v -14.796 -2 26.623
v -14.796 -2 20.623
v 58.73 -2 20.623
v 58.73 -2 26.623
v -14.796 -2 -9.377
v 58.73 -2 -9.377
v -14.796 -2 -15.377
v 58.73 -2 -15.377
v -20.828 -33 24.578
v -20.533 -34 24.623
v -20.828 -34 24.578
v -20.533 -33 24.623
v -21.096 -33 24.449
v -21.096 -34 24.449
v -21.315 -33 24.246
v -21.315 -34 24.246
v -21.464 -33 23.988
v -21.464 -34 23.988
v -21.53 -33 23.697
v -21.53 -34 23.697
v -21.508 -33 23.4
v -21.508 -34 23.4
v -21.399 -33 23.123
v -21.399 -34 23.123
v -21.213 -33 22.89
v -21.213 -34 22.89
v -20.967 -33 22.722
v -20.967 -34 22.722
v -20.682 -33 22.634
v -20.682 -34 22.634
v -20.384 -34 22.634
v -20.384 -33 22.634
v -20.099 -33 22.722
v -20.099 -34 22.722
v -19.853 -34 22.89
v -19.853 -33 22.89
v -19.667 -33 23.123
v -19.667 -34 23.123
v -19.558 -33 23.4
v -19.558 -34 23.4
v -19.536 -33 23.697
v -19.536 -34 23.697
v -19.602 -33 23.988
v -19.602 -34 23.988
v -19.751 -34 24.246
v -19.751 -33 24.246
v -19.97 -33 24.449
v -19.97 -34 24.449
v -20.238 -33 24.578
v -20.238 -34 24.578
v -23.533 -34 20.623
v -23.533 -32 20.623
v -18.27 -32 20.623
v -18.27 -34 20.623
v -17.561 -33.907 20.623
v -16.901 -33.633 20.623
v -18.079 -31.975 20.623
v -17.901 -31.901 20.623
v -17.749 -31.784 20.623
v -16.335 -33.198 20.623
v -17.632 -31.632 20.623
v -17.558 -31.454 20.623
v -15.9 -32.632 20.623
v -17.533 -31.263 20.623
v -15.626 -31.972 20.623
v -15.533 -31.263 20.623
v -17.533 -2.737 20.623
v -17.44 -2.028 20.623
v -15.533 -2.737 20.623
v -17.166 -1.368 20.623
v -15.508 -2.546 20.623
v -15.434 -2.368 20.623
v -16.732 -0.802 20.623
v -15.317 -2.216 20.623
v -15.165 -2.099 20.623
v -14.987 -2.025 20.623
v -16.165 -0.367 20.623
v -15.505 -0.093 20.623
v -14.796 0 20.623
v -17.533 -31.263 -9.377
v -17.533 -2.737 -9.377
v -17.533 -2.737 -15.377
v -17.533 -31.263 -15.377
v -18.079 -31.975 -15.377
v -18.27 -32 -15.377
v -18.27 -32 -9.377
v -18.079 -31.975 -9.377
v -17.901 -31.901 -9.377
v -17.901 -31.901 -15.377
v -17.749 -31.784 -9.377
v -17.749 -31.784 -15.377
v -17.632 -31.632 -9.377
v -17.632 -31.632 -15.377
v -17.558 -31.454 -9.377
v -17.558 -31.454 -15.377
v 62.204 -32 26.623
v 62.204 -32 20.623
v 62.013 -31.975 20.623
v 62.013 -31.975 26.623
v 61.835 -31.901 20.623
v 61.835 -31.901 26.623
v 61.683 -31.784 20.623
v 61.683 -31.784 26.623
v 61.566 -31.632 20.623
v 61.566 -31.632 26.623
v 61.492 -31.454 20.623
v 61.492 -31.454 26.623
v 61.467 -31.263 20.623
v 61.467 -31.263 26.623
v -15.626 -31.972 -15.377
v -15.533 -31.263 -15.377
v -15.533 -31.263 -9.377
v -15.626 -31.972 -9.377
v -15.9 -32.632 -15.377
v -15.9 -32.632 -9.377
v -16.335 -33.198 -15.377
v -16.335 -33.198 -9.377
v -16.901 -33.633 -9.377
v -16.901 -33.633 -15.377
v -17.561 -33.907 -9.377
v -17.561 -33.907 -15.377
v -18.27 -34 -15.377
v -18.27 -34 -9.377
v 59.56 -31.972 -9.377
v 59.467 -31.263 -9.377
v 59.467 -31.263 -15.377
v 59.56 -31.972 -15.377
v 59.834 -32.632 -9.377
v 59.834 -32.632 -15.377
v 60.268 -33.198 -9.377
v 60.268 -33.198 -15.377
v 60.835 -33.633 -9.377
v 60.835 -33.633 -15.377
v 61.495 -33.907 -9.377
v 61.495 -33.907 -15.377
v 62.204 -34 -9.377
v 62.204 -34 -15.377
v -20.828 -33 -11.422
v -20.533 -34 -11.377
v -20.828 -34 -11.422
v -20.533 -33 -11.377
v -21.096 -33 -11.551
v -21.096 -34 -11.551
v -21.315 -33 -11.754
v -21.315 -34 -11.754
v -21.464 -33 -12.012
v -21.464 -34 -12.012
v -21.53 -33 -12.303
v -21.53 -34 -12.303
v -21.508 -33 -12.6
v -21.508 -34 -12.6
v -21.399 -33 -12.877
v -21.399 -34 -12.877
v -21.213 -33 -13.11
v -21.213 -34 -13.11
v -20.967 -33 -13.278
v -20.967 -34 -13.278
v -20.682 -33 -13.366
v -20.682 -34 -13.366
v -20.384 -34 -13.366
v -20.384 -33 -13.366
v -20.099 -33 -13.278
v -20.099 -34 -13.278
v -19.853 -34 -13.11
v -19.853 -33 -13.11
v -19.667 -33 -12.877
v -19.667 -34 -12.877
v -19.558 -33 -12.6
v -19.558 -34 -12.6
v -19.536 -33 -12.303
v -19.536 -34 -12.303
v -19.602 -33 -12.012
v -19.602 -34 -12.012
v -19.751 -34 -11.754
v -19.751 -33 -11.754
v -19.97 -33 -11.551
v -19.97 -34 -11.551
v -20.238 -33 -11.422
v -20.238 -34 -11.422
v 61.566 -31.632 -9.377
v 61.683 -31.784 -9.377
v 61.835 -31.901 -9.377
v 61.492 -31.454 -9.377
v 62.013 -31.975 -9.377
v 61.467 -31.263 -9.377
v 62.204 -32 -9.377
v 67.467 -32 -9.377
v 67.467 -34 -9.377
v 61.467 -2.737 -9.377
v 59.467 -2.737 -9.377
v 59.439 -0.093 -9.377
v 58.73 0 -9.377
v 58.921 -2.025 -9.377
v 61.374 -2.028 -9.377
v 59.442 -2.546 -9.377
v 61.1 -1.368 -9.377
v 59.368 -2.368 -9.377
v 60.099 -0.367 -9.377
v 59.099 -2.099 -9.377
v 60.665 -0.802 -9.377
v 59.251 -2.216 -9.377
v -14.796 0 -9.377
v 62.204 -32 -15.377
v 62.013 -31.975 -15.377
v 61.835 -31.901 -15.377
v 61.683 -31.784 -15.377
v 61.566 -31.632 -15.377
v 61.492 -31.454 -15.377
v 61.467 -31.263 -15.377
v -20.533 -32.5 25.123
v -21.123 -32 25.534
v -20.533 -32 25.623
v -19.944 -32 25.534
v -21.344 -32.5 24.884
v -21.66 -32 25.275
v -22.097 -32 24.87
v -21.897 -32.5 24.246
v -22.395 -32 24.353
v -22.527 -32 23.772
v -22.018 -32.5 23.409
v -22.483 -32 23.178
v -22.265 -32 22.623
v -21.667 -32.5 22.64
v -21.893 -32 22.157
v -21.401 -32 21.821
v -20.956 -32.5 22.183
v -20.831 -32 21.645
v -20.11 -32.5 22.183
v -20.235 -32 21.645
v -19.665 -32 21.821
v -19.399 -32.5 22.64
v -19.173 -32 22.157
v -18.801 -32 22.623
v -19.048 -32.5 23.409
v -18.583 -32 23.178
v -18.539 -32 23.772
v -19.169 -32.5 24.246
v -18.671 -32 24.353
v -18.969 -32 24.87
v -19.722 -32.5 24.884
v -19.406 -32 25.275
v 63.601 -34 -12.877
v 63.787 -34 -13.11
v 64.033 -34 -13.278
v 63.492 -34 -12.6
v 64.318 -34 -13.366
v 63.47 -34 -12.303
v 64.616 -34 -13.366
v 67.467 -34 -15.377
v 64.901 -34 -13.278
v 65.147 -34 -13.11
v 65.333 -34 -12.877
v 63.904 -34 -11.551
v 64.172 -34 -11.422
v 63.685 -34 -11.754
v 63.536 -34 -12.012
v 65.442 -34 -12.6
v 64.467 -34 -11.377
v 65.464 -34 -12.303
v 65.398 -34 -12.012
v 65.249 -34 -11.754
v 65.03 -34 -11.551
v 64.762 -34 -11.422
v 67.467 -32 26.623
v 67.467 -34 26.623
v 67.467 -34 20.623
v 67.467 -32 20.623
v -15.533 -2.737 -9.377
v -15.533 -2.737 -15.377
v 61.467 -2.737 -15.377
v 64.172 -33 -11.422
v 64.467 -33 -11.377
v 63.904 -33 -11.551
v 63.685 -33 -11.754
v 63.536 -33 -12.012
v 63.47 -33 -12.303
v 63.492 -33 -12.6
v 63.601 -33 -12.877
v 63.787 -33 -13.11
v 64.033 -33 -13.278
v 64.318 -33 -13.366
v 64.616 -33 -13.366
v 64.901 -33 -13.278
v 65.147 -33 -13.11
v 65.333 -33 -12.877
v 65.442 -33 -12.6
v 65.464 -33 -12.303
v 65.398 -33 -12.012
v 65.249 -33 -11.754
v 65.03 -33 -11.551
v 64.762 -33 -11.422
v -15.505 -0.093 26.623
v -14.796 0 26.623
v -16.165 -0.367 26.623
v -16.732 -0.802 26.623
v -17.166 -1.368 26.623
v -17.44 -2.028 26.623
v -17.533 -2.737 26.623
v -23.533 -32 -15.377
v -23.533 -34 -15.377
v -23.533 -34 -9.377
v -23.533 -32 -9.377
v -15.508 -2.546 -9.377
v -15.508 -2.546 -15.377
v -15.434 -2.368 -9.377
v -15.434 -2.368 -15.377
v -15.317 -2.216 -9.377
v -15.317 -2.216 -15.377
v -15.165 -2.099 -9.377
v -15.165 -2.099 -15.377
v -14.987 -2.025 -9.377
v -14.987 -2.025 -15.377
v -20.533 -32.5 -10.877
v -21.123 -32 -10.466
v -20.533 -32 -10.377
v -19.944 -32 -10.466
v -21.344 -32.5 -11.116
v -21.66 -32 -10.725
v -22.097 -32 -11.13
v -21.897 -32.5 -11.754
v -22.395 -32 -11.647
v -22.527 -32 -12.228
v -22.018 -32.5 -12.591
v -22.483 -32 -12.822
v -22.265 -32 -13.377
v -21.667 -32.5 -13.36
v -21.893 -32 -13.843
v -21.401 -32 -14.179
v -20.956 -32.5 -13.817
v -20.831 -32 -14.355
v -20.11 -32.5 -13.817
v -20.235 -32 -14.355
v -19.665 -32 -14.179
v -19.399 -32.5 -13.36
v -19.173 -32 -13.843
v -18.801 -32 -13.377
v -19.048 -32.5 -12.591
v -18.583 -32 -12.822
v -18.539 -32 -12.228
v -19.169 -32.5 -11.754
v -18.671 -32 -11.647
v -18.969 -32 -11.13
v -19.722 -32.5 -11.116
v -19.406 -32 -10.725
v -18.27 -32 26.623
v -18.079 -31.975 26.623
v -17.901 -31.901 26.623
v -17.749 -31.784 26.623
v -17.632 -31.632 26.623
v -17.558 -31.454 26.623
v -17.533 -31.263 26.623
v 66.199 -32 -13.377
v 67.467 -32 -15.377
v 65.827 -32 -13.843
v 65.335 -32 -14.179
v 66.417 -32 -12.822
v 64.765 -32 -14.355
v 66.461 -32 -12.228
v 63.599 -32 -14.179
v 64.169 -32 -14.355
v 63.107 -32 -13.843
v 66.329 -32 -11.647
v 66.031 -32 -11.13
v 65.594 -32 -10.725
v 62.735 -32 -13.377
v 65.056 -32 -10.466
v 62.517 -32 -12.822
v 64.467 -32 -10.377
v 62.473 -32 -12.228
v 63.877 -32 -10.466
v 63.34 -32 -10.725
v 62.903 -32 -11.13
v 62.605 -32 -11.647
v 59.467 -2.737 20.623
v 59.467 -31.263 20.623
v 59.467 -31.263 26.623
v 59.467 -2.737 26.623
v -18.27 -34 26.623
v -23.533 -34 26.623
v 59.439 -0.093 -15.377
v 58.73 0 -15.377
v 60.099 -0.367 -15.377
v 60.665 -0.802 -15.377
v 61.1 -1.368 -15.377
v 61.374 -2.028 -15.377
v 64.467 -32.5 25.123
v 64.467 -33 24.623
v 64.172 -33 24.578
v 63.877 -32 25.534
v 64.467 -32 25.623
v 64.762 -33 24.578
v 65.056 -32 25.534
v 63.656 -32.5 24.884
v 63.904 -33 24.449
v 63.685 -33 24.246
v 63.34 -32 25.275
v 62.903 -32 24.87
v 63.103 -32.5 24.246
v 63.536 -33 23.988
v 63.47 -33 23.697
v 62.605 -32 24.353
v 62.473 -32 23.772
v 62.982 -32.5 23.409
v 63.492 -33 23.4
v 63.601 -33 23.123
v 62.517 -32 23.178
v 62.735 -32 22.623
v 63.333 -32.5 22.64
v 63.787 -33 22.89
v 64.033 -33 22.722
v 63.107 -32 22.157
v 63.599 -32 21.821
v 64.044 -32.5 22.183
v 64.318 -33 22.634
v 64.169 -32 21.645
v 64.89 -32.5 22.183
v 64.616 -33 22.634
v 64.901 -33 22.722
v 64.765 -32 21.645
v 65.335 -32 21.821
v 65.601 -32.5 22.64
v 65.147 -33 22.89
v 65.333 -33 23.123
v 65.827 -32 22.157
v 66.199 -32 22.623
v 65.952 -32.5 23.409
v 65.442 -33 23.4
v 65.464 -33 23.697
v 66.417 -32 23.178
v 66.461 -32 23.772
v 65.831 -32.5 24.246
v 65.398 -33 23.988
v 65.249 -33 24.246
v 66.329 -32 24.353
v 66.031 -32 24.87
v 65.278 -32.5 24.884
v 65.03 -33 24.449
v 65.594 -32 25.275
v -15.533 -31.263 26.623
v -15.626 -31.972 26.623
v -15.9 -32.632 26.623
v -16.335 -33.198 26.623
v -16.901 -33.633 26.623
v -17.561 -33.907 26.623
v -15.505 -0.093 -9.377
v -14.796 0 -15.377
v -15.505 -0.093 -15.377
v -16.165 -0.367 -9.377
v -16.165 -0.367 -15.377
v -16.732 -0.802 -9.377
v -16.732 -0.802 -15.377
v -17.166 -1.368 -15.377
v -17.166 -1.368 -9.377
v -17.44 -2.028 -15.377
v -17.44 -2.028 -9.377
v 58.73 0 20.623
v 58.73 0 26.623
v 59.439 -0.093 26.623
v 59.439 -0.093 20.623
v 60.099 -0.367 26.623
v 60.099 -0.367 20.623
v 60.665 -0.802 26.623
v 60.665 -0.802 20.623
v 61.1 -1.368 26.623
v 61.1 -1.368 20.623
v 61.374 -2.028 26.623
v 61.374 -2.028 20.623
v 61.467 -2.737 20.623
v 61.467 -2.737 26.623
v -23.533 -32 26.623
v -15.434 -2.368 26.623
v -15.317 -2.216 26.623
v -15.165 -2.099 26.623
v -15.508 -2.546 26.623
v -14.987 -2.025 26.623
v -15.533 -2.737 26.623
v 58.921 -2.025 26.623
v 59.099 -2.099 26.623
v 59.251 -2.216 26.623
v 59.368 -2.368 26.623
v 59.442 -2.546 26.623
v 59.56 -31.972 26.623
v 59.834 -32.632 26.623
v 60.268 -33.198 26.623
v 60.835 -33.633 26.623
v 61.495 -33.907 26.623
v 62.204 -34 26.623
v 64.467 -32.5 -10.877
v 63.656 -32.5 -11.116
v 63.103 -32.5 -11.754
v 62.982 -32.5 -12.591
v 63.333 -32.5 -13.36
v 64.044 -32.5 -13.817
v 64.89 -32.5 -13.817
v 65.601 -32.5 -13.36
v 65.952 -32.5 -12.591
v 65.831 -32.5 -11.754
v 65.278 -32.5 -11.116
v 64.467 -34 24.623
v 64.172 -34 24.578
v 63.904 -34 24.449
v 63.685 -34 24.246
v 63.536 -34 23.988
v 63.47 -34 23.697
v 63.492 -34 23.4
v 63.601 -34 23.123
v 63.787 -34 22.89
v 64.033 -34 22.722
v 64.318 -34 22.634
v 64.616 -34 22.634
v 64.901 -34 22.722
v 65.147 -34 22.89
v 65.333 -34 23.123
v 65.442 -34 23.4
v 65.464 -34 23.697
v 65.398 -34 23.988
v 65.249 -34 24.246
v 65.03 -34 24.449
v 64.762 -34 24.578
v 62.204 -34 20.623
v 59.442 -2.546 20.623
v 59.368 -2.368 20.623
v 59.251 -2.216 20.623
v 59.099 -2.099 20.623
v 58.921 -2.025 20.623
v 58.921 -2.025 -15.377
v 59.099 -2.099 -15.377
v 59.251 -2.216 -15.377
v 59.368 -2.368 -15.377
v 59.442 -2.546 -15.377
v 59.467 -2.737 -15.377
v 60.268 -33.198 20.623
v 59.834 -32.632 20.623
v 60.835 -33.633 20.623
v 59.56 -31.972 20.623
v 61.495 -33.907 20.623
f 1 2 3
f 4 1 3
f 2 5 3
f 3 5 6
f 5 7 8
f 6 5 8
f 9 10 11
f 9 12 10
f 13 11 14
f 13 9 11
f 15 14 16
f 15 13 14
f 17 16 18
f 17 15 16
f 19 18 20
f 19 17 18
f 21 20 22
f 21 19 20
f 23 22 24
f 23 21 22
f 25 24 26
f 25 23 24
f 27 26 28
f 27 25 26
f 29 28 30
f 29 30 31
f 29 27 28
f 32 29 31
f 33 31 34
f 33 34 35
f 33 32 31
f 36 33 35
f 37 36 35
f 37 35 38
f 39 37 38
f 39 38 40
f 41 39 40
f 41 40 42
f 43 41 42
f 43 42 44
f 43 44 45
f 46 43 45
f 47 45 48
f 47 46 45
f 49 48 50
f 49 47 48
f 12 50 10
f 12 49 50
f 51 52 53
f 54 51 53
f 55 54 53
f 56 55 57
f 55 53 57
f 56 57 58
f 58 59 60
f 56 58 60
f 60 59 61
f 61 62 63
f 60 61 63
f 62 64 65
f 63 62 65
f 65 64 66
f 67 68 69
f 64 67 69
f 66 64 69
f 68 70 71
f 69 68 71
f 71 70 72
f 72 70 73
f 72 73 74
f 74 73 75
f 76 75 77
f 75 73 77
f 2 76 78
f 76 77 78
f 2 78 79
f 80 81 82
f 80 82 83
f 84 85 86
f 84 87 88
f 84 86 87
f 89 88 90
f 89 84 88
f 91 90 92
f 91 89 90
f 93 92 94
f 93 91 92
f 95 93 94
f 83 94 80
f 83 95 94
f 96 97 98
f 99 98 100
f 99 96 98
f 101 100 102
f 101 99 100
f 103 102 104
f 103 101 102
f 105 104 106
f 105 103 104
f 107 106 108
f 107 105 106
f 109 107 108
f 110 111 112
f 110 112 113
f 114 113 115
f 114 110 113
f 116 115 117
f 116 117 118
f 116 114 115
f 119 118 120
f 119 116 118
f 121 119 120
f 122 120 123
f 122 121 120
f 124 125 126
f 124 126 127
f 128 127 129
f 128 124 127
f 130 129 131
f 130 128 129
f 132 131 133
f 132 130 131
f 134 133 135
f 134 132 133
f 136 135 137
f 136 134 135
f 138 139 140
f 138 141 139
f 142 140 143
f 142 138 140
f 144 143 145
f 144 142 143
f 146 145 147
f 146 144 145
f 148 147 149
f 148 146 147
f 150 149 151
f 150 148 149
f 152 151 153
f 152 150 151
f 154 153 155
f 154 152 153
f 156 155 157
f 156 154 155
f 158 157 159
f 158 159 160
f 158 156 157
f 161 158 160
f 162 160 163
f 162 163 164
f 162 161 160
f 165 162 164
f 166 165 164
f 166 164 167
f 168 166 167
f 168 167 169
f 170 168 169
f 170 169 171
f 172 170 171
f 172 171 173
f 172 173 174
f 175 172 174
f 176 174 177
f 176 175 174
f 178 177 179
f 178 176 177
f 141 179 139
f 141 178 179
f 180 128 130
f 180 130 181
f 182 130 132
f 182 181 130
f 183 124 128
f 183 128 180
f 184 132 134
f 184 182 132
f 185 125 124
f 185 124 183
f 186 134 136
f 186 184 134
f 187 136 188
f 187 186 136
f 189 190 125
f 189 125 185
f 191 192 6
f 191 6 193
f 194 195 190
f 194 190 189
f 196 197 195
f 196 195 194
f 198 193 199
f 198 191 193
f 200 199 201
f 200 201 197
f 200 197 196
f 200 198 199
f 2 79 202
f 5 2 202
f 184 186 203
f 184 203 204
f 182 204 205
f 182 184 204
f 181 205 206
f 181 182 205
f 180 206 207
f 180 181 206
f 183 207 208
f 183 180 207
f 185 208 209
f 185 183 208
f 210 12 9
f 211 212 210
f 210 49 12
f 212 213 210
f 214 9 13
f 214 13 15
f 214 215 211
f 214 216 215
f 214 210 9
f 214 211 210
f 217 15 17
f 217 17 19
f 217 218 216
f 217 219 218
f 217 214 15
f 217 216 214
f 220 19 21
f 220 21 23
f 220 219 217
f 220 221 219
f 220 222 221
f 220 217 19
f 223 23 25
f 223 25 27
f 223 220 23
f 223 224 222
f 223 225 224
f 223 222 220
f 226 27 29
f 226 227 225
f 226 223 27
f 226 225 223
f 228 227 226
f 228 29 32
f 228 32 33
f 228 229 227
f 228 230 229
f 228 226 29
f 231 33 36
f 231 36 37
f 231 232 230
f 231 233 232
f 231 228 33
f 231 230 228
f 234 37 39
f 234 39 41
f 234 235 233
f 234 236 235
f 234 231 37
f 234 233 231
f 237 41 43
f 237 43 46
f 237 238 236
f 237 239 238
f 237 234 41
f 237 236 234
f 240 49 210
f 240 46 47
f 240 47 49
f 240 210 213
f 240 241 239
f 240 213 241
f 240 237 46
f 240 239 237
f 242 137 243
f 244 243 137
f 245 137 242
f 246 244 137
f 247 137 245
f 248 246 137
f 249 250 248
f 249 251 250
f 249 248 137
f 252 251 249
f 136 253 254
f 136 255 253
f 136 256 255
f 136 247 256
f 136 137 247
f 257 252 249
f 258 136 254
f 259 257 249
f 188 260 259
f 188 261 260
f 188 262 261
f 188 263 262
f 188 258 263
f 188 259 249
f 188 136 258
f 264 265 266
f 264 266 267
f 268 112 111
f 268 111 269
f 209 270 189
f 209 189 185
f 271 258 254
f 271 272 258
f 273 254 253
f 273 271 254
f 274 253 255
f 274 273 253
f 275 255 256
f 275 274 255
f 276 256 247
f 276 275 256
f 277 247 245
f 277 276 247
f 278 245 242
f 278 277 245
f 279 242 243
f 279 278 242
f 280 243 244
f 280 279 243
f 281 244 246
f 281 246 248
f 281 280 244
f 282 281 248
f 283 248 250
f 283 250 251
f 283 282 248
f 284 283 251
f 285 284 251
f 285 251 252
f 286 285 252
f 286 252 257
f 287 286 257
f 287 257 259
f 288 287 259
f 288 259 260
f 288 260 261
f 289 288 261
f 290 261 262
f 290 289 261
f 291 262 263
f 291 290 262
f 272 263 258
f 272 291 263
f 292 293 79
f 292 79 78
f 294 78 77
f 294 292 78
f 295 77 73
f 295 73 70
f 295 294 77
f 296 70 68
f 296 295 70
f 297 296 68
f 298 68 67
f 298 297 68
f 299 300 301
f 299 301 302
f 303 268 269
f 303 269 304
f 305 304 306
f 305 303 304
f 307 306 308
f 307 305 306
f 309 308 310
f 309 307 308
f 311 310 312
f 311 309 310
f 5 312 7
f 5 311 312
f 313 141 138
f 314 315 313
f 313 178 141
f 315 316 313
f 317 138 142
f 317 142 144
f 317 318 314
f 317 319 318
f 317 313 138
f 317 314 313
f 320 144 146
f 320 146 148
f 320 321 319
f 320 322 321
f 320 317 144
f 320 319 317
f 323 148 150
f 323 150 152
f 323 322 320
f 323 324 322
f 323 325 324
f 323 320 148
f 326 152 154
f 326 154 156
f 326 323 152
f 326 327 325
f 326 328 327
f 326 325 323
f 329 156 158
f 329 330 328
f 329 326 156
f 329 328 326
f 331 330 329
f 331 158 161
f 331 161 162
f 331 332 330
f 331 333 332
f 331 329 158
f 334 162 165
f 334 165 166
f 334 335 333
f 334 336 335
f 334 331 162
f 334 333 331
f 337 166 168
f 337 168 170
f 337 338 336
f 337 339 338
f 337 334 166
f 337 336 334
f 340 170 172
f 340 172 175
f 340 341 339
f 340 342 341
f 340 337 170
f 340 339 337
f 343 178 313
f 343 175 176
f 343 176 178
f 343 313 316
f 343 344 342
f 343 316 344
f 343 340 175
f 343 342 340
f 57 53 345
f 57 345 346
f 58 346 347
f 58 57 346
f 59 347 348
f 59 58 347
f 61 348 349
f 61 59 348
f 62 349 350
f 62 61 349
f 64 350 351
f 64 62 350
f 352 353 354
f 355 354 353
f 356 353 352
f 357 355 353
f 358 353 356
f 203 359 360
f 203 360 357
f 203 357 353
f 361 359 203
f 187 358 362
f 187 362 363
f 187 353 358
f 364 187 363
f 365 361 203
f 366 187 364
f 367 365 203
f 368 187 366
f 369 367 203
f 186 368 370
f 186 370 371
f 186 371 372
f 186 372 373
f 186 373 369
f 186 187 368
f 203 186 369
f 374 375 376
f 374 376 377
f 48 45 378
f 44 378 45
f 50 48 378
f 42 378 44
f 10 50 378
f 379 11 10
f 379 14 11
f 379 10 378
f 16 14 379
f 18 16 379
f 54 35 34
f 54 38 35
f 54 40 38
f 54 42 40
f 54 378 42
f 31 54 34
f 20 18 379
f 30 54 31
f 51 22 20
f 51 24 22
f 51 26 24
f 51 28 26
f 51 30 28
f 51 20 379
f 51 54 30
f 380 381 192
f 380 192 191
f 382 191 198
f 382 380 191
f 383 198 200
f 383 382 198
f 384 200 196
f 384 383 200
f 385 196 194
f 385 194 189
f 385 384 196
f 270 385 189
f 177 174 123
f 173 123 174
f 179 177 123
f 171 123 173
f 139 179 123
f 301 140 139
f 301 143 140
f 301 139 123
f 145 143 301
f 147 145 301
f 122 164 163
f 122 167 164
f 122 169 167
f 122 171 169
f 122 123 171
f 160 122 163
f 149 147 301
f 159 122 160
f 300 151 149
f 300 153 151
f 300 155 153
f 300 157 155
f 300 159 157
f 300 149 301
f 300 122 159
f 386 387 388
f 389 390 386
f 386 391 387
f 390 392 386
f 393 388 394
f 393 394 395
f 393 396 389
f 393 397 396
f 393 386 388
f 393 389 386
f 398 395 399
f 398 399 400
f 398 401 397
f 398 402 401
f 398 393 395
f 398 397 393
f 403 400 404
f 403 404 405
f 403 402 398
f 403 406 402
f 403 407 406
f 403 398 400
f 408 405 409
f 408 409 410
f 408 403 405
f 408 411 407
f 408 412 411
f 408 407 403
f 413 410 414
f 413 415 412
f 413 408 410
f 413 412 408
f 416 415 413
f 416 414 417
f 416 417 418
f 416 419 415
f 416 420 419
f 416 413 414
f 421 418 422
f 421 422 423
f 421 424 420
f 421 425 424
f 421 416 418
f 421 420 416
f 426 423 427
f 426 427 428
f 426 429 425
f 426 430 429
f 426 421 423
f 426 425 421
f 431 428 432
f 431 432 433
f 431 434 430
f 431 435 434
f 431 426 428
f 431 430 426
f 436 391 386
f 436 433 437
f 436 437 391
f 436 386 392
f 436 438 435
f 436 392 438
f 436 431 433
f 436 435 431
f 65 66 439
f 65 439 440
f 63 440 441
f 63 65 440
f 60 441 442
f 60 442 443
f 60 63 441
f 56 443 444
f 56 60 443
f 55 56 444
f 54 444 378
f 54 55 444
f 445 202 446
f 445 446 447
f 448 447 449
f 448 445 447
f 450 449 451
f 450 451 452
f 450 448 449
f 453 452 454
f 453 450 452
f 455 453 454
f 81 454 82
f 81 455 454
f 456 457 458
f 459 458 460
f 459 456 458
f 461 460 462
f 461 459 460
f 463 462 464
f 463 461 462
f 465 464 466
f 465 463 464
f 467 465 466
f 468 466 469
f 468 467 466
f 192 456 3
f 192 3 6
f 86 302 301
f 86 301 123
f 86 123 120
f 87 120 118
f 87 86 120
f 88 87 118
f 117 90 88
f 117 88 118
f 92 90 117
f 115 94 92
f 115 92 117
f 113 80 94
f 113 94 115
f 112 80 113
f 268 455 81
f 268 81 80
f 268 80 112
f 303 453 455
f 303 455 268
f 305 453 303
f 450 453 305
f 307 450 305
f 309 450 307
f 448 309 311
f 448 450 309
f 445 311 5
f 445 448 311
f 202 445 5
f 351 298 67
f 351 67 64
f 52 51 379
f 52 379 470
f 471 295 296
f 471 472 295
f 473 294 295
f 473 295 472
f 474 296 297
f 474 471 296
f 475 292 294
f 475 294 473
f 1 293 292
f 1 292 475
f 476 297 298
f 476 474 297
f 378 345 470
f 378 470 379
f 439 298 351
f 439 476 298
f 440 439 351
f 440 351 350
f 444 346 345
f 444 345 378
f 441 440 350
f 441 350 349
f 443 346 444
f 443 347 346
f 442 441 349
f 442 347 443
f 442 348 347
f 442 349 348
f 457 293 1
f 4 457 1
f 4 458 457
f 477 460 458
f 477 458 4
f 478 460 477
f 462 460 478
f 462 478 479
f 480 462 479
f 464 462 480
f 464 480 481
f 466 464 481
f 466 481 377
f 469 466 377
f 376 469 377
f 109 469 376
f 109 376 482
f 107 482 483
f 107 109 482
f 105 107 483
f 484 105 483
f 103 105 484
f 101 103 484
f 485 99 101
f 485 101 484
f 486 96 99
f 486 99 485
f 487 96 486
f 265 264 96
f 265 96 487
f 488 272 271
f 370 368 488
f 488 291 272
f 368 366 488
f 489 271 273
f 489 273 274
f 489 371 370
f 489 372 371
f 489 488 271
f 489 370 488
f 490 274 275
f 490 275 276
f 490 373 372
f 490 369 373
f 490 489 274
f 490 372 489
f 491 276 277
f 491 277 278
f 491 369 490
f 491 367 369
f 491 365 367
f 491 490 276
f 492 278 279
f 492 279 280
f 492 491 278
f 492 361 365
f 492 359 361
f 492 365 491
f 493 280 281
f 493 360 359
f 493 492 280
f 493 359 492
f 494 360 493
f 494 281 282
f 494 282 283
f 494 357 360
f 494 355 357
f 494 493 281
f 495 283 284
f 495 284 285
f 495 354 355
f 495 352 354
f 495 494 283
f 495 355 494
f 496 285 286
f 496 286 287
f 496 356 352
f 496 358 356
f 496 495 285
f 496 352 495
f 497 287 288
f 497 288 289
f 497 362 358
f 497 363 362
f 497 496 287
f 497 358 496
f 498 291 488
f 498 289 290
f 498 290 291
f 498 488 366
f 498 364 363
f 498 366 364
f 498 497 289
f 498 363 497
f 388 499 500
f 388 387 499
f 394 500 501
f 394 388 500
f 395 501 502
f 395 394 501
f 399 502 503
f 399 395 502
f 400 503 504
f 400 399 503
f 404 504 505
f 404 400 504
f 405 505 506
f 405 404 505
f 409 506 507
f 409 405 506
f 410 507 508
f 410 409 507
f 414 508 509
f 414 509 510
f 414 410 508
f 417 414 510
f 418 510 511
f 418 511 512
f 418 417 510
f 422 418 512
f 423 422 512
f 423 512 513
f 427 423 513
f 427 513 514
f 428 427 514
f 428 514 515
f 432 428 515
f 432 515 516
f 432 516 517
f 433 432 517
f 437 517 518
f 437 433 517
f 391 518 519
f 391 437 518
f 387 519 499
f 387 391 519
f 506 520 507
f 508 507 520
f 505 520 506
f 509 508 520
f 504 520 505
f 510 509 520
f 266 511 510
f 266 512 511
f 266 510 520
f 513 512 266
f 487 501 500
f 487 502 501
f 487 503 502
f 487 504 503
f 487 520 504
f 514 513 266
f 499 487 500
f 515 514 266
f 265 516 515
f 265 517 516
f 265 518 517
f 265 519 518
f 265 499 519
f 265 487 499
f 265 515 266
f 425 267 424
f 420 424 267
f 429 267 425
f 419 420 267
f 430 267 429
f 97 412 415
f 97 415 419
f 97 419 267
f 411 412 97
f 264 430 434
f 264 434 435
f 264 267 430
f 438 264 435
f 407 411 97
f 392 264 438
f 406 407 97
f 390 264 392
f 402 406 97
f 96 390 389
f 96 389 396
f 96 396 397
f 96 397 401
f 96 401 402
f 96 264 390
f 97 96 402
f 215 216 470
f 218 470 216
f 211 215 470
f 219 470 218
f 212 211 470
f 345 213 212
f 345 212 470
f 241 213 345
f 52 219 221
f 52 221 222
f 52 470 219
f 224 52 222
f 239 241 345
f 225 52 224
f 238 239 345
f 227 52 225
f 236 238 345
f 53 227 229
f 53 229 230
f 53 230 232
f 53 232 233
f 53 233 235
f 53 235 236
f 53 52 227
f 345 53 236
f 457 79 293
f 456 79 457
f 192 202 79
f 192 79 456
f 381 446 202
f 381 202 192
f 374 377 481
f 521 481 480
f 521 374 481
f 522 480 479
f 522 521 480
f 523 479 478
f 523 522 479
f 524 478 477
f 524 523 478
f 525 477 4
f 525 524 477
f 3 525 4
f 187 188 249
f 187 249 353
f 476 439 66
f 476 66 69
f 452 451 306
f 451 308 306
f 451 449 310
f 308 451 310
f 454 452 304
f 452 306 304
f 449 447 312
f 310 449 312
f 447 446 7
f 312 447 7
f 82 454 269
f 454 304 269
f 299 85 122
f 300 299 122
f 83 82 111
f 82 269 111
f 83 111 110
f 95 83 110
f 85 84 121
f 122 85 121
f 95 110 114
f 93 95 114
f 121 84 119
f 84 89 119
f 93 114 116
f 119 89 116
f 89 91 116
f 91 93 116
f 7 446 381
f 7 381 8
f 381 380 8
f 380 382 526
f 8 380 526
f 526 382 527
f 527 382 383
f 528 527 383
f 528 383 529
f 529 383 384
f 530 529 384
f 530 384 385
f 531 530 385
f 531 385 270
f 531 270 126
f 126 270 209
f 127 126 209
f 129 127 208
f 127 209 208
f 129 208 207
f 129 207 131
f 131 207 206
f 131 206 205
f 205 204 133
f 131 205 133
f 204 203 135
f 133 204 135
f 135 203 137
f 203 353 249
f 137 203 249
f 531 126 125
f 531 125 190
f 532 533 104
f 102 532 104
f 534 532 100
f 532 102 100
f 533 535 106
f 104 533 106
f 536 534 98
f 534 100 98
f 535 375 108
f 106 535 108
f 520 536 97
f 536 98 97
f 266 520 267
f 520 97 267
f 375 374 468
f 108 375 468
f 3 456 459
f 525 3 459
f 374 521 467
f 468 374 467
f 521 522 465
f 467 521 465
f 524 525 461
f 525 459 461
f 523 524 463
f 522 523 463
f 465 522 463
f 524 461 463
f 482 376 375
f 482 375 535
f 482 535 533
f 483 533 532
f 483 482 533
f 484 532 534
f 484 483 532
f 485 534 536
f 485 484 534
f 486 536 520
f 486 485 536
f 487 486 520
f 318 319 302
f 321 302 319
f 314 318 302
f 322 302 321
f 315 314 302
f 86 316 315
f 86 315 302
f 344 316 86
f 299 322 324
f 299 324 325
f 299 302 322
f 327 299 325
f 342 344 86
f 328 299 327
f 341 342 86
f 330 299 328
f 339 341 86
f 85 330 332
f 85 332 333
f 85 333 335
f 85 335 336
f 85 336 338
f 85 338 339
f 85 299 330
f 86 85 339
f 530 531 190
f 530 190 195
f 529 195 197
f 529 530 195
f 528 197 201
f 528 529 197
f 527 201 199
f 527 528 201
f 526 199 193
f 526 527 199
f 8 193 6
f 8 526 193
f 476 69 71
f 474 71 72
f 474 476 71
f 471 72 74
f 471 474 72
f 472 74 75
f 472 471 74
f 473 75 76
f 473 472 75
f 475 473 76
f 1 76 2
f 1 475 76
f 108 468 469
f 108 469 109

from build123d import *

# Parameters (mm, degrees)
SKETCH_2_W                       = 75
SKETCH_2_H                       = 42
SM_BASE_FLANGE_1_DEPTH           = 2
SM_EDGE_FLANGE_1_STRIP_W         = 9.4732
SM_EDGE_FLANGE_1_STRIP_H         = 2
SM_EDGE_FLANGE_1_STRIP_CUT_DEPTH = 42
SM_EDGE_FLANGE_1_DEPTH           = 42
SM_EDGE_FLANGE_2_STRIP_W         = 9.4732
SM_EDGE_FLANGE_2_STRIP_H         = 2
SM_EDGE_FLANGE_2_STRIP_CUT_DEPTH = 42
SM_EDGE_FLANGE_2_DEPTH           = 42
SM_EDGE_FLANGE_3_STRIP_W         = 9.4732
SM_EDGE_FLANGE_3_STRIP_H         = 2
SM_EDGE_FLANGE_3_STRIP_CUT_DEPTH = 42
SM_EDGE_FLANGE_3_DEPTH           = 42
SM_EDGE_FLANGE_4_STRIP_W         = 9.4732
SM_EDGE_FLANGE_4_STRIP_H         = 2
SM_EDGE_FLANGE_4_STRIP_CUT_DEPTH = 42
SM_EDGE_FLANGE_4_DEPTH           = 42
HOLE_WIZARD_M2_4_AT_2_COUNT      = 2
HOLE_WIZARD_M2_4_AT_2_PITCH      = 36
HOLE_WIZARD_M2_4_AT_3_COUNT      = 2
HOLE_WIZARD_M2_4_AT_3_PITCH      = 85
HOLE_WIZARD_M2_4_AT_4_COUNT      = 2
HOLE_WIZARD_M2_4_AT_4_PITCH      = 92.309262807
SKETCH_27_W                      = 8.7366
SKETCH_27_H                      = 30
CUT_EXTRUDE_2319_DEPTH           = 38


# Sheet-metal steps are written as plain solids
with BuildPart() as part:
    # Sketch 2 → 基体-法兰1 (new body)
    with BuildSketch(Plane(origin=(0, 0, 0), x_dir=(1, 0, 0), z_dir=(0, 1, 0))):
        with Locations((21.966960091, -5.622610863)):
            Rectangle(SKETCH_2_W, SKETCH_2_H)
    extrude(amount=-SM_BASE_FLANGE_1_DEPTH)

    # 边线-法兰1 strip (across the edge) → 边线-法兰1 strip cut (cut)
    with BuildSketch(Plane(origin=(-15.533039909, -2, 26.622610863), x_dir=(1, 0, 0), z_dir=(0, 0, -1))):
        with Locations((-4, -1)):
            Rectangle(SM_EDGE_FLANGE_1_STRIP_W, SM_EDGE_FLANGE_1_STRIP_H)
    extrude(amount=SM_EDGE_FLANGE_1_STRIP_CUT_DEPTH, mode=Mode.SUBTRACT)

    # 边线-法兰1 section (across the edge) → 边线-法兰1 (add)
    with BuildSketch(Plane(origin=(-15.533039909, -2, 26.622610863), x_dir=(1, 0, 0), z_dir=(0, 0, -1))):
        with BuildLine():
            Line((-2, 0.7366), (-2, 30))
            Line((-2, 30), (0, 30))
            Line((0, 30), (0, 0.7366))
            ThreePointArc((0, 0.7366), (0.215745145, 0.215745145), (0.7366, 0))
            Line((0.7366, 0), (0.7366, -2))
            ThreePointArc((0.7366, -2), (-1.198468417, -1.198468417), (-2, 0.7366))
        make_face()
    extrude(amount=SM_EDGE_FLANGE_1_DEPTH)

    # 边线-法兰2 strip (across the edge) → 边线-法兰2 strip cut (cut)
    with BuildSketch(Plane(origin=(59.466960091, -2, -15.377389137), x_dir=(-1, 0, 0), z_dir=(0, 0, 1))):
        with Locations((-4, -1)):
            Rectangle(SM_EDGE_FLANGE_2_STRIP_W, SM_EDGE_FLANGE_2_STRIP_H)
    extrude(amount=SM_EDGE_FLANGE_2_STRIP_CUT_DEPTH, mode=Mode.SUBTRACT)

    # 边线-法兰2 section (across the edge) → 边线-法兰2 (add)
    with BuildSketch(Plane(origin=(59.466960091, -2, -15.377389137), x_dir=(-1, 0, 0), z_dir=(0, 0, 1))):
        with BuildLine():
            Line((-2, 0.7366), (-2, 30))
            Line((-2, 30), (0, 30))
            Line((0, 30), (0, 0.7366))
            ThreePointArc((0, 0.7366), (0.215745145, 0.215745145), (0.7366, 0))
            Line((0.7366, 0), (0.7366, -2))
            ThreePointArc((0.7366, -2), (-1.198468417, -1.198468417), (-2, 0.7366))
        make_face()
    extrude(amount=SM_EDGE_FLANGE_2_DEPTH)

    # 边线-法兰3 strip (across the edge) → 边线-法兰3 strip cut (cut)
    with BuildSketch(Plane(origin=(-17.533039909, -32, -15.377389137), x_dir=(0, 1, 0), z_dir=(0, 0, 1))):
        with Locations((-4, -1)):
            Rectangle(SM_EDGE_FLANGE_3_STRIP_W, SM_EDGE_FLANGE_3_STRIP_H)
    extrude(amount=SM_EDGE_FLANGE_3_STRIP_CUT_DEPTH, mode=Mode.SUBTRACT)

    # 边线-法兰3 section (across the edge) → 边线-法兰3 (add)
    with BuildSketch(Plane(origin=(-17.533039909, -32, -15.377389137), x_dir=(0, 1, 0), z_dir=(0, 0, 1))):
        with BuildLine():
            Line((-2, 0.7366), (-2, 6))
            Line((-2, 6), (0, 6))
            Line((0, 6), (0, 0.7366))
            ThreePointArc((0, 0.7366), (0.215745145, 0.215745145), (0.7366, 0))
            Line((0.7366, 0), (0.7366, -2))
            ThreePointArc((0.7366, -2), (-1.198468417, -1.198468417), (-2, 0.7366))
        make_face()
    extrude(amount=SM_EDGE_FLANGE_3_DEPTH)

    # 边线-法兰4 strip (across the edge) → 边线-法兰4 strip cut (cut)
    with BuildSketch(Plane(origin=(61.466960091, -32, 26.622610863), x_dir=(0, 1, 0), z_dir=(0, 0, -1))):
        with Locations((-4, -1)):
            Rectangle(SM_EDGE_FLANGE_4_STRIP_W, SM_EDGE_FLANGE_4_STRIP_H)
    extrude(amount=SM_EDGE_FLANGE_4_STRIP_CUT_DEPTH, mode=Mode.SUBTRACT)

    # 边线-法兰4 section (across the edge) → 边线-法兰4 (add)
    with BuildSketch(Plane(origin=(61.466960091, -32, 26.622610863), x_dir=(0, 1, 0), z_dir=(0, 0, -1))):
        with BuildLine():
            Line((-2, 0.7366), (-2, 6))
            Line((-2, 6), (0, 6))
            Line((0, 6), (0, 0.7366))
            ThreePointArc((0, 0.7366), (0.215745145, 0.215745145), (0.7366, 0))
            Line((0.7366, 0), (0.7366, -2))
            ThreePointArc((0.7366, -2), (-1.198468417, -1.198468417), (-2, 0.7366))
        make_face()
    extrude(amount=SM_EDGE_FLANGE_4_DEPTH)

    # 草图26 → M2*4 (revolve, cut)
    with BuildSketch(Plane(origin=(-20.533039909, -32, -12.377389137), x_dir=(0, 0, 1), z_dir=(1, 0, 0))):
        Polygon((0, 0), (0, 2), (1, 2), (1, 1), (2, 0), align=None)
    hole_wizard_m2_4 = revolve(axis=Axis((-20.533039909, -25.65, -12.377389137), (0, -1, 0)), mode=Mode.SUBTRACT)

    # M2*4 at 2: M2*4 ×2
    with Locations(*[(0, 0, i * HOLE_WIZARD_M2_4_AT_2_PITCH) for i in range(1, HOLE_WIZARD_M2_4_AT_2_COUNT)]):
        add(hole_wizard_m2_4, mode=Mode.SUBTRACT)

    # M2*4 at 3: M2*4 ×2
    with Locations(*[(i * HOLE_WIZARD_M2_4_AT_3_PITCH, 0, 0) for i in range(1, HOLE_WIZARD_M2_4_AT_3_COUNT)]):
        add(hole_wizard_m2_4, mode=Mode.SUBTRACT)

    # M2*4 at 4: M2*4 ×2
    with Locations(*[Vector(0.9208176667771376, 0, 0.38999336475266905) * (i * HOLE_WIZARD_M2_4_AT_4_PITCH) for i in range(1, HOLE_WIZARD_M2_4_AT_4_COUNT)]):
        add(hole_wizard_m2_4, mode=Mode.SUBTRACT)

    # 草图27 → Cut-Extrude 2319 (cut)
    with BuildSketch(Plane(origin=(0, 0, 0), x_dir=(1, 0, 0), z_dir=(0, 1, 0))):
        with Locations((-19.164739909, -5.622610863)):
            Rectangle(SKETCH_27_W, SKETCH_27_H)
        with Locations((63.098660091, -5.622610863)):
            Rectangle(SKETCH_27_W, SKETCH_27_H)
    extrude(amount=-CUT_EXTRUDE_2319_DEPTH, mode=Mode.SUBTRACT)


solid = part.part
